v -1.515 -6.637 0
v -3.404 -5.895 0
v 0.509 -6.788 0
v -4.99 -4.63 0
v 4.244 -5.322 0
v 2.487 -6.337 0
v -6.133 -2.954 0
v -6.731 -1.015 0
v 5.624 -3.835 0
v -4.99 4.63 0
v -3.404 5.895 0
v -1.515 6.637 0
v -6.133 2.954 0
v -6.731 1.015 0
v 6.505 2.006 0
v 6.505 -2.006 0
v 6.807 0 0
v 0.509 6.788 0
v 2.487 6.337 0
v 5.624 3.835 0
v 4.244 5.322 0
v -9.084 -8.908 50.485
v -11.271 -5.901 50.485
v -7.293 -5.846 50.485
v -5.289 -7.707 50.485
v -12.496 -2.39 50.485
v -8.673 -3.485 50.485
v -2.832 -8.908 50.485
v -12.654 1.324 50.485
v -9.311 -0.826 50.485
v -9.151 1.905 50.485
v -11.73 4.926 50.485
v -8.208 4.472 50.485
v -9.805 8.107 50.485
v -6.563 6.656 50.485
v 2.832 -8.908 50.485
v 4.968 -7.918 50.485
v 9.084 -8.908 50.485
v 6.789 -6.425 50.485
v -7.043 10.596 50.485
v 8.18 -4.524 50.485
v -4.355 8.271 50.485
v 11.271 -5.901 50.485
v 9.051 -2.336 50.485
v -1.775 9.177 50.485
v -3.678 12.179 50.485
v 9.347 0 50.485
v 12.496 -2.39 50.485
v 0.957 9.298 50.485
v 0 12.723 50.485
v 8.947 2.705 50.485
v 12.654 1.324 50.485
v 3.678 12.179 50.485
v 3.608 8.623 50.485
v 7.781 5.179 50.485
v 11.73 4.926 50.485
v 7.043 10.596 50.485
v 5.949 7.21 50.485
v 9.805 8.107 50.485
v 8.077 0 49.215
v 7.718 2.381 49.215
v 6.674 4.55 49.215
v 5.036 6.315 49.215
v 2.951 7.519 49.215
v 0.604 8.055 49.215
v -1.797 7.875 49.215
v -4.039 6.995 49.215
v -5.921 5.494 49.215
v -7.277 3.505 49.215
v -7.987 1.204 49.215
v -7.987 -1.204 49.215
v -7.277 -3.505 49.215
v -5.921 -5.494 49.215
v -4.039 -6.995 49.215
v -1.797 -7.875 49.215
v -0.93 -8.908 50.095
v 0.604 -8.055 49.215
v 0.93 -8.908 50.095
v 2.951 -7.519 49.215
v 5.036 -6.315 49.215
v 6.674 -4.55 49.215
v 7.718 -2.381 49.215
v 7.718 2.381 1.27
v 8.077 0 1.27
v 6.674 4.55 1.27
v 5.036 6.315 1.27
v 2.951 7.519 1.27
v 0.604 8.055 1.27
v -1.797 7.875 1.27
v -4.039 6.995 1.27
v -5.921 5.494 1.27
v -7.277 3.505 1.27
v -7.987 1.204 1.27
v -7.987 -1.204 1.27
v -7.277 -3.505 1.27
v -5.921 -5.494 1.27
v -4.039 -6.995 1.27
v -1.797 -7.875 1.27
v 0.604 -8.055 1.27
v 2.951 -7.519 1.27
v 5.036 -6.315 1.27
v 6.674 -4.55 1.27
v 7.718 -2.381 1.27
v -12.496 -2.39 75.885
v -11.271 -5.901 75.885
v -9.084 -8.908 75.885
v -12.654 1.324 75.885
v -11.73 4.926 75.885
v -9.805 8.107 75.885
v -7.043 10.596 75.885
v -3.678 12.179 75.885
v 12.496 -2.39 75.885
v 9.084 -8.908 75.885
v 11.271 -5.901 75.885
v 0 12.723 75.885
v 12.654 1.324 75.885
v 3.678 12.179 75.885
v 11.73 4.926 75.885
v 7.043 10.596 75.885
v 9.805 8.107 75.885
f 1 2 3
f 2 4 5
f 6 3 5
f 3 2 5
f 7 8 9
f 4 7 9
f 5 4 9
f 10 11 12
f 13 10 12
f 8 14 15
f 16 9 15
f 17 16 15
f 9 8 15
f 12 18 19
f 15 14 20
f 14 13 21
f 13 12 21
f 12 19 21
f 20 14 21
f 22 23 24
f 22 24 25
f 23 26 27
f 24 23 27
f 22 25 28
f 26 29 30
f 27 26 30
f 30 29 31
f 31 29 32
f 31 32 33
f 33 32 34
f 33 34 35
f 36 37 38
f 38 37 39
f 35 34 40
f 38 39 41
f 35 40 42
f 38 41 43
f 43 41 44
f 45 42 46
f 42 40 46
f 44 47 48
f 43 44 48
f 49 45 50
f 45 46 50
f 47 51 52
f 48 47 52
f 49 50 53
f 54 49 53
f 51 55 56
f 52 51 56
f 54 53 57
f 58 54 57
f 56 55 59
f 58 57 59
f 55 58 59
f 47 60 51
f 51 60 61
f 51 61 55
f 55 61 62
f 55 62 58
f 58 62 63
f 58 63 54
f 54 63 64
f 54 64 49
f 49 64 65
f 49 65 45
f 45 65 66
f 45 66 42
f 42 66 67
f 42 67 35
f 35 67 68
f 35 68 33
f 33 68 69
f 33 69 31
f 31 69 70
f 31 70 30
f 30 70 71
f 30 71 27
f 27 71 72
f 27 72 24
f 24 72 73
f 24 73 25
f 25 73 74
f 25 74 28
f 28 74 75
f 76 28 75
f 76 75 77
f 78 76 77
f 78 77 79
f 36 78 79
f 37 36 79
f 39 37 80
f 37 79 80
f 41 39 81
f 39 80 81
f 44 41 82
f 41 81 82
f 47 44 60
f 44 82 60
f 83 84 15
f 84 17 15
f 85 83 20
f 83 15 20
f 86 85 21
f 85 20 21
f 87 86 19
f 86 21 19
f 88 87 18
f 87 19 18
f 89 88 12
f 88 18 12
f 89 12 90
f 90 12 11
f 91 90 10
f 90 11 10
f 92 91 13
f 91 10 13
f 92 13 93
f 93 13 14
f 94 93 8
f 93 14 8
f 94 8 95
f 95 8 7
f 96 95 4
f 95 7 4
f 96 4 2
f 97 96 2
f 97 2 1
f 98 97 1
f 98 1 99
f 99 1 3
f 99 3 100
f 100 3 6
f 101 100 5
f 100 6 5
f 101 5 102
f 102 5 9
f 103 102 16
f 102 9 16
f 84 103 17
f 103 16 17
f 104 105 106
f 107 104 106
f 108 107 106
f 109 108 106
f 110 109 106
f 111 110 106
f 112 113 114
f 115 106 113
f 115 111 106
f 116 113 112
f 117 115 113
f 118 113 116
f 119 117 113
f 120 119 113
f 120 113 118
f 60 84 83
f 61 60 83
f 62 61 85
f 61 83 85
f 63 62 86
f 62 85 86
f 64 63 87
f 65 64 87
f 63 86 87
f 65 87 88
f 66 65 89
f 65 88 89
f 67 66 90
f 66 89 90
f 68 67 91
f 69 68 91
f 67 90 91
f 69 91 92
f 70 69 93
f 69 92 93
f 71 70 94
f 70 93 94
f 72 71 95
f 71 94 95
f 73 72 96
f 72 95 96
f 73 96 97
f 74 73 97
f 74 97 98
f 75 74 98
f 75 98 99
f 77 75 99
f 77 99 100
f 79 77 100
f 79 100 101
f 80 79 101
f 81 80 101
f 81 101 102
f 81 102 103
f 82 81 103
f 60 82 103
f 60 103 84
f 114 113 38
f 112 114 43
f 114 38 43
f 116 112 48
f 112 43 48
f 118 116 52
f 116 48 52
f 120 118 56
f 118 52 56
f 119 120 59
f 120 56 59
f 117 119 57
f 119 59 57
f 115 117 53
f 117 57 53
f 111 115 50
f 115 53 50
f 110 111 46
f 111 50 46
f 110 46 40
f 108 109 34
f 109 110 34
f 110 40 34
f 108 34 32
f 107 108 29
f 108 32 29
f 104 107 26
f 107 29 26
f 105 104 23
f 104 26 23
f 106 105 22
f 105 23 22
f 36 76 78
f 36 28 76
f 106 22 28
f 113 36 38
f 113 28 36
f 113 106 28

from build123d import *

# Parameters (mm, degrees)
F0_R     = 8.0772
F1_DEPTH = 50.48541
F2_R     = 12.7227956512
F3_DEPTH = 25.4
F5_DEPTH = 25.4


# Not quite as in the source:
# - a fillet or chamfer that OpenCascade refuses, or shapes differently, is made with other operations: its cross-section is extruded or revolved along the edge and cut away or added


with BuildPart() as f1:
    # F0 (on Top) → F1 (new body)
    with BuildSketch(Plane.XY):
        Circle(F0_R)
    extrude(amount=F1_DEPTH)

    # F2 (on face) → F3 (join)
    with BuildSketch(Plane.XY.offset(50.48541)):
        Circle(F2_R)
    extrude(amount=F3_DEPTH)

    # F4 (on face) → F5 (cut)
    with BuildSketch(Plane.XY.offset(75.88541)):
        with BuildLine():
            Line((9.0839408688, -8.9079485558), (-9.0839408688, -8.9079485558))
            ThreePointArc((-9.0839408688, -8.9079485558), (0, -12.7227956512), (9.0839408688, -8.9079485558))
        make_face()
    extrude(amount=-F5_DEPTH, mode=Mode.SUBTRACT)

    # F6: chamfer of 1.27 on 2 edges, made by hand


with BuildPart() as f6_tool2:
    # F6_s3 → F6_t4 (revolve)
    with BuildSketch(Plane.XZ):
        Polygon((9.3472, 50.48541), (8.0772, 49.21541), (8.0772, 50.48541), align=None)
    revolve(axis=Axis((0, 0, 50.48541), (0, 0, 1)))

    split(bisect_by=Plane.XZ.offset(8.9079485558), keep=Keep.BOTTOM)


with BuildPart() as f1_1:
    add(f1.part)

    # F6_t1: union F6_tool2
    add(f6_tool2.part)

    # F6_s6 → F6_t7 (revolve, cut)
    with BuildSketch(Plane.XZ):
        Polygon((8.0772, 1.27), (6.8072, 0), (8.0772, 0), align=None)
    revolve(axis=Axis((0, 0, 0), (0, 0, 1)), mode=Mode.SUBTRACT)


solid = f1_1.part
